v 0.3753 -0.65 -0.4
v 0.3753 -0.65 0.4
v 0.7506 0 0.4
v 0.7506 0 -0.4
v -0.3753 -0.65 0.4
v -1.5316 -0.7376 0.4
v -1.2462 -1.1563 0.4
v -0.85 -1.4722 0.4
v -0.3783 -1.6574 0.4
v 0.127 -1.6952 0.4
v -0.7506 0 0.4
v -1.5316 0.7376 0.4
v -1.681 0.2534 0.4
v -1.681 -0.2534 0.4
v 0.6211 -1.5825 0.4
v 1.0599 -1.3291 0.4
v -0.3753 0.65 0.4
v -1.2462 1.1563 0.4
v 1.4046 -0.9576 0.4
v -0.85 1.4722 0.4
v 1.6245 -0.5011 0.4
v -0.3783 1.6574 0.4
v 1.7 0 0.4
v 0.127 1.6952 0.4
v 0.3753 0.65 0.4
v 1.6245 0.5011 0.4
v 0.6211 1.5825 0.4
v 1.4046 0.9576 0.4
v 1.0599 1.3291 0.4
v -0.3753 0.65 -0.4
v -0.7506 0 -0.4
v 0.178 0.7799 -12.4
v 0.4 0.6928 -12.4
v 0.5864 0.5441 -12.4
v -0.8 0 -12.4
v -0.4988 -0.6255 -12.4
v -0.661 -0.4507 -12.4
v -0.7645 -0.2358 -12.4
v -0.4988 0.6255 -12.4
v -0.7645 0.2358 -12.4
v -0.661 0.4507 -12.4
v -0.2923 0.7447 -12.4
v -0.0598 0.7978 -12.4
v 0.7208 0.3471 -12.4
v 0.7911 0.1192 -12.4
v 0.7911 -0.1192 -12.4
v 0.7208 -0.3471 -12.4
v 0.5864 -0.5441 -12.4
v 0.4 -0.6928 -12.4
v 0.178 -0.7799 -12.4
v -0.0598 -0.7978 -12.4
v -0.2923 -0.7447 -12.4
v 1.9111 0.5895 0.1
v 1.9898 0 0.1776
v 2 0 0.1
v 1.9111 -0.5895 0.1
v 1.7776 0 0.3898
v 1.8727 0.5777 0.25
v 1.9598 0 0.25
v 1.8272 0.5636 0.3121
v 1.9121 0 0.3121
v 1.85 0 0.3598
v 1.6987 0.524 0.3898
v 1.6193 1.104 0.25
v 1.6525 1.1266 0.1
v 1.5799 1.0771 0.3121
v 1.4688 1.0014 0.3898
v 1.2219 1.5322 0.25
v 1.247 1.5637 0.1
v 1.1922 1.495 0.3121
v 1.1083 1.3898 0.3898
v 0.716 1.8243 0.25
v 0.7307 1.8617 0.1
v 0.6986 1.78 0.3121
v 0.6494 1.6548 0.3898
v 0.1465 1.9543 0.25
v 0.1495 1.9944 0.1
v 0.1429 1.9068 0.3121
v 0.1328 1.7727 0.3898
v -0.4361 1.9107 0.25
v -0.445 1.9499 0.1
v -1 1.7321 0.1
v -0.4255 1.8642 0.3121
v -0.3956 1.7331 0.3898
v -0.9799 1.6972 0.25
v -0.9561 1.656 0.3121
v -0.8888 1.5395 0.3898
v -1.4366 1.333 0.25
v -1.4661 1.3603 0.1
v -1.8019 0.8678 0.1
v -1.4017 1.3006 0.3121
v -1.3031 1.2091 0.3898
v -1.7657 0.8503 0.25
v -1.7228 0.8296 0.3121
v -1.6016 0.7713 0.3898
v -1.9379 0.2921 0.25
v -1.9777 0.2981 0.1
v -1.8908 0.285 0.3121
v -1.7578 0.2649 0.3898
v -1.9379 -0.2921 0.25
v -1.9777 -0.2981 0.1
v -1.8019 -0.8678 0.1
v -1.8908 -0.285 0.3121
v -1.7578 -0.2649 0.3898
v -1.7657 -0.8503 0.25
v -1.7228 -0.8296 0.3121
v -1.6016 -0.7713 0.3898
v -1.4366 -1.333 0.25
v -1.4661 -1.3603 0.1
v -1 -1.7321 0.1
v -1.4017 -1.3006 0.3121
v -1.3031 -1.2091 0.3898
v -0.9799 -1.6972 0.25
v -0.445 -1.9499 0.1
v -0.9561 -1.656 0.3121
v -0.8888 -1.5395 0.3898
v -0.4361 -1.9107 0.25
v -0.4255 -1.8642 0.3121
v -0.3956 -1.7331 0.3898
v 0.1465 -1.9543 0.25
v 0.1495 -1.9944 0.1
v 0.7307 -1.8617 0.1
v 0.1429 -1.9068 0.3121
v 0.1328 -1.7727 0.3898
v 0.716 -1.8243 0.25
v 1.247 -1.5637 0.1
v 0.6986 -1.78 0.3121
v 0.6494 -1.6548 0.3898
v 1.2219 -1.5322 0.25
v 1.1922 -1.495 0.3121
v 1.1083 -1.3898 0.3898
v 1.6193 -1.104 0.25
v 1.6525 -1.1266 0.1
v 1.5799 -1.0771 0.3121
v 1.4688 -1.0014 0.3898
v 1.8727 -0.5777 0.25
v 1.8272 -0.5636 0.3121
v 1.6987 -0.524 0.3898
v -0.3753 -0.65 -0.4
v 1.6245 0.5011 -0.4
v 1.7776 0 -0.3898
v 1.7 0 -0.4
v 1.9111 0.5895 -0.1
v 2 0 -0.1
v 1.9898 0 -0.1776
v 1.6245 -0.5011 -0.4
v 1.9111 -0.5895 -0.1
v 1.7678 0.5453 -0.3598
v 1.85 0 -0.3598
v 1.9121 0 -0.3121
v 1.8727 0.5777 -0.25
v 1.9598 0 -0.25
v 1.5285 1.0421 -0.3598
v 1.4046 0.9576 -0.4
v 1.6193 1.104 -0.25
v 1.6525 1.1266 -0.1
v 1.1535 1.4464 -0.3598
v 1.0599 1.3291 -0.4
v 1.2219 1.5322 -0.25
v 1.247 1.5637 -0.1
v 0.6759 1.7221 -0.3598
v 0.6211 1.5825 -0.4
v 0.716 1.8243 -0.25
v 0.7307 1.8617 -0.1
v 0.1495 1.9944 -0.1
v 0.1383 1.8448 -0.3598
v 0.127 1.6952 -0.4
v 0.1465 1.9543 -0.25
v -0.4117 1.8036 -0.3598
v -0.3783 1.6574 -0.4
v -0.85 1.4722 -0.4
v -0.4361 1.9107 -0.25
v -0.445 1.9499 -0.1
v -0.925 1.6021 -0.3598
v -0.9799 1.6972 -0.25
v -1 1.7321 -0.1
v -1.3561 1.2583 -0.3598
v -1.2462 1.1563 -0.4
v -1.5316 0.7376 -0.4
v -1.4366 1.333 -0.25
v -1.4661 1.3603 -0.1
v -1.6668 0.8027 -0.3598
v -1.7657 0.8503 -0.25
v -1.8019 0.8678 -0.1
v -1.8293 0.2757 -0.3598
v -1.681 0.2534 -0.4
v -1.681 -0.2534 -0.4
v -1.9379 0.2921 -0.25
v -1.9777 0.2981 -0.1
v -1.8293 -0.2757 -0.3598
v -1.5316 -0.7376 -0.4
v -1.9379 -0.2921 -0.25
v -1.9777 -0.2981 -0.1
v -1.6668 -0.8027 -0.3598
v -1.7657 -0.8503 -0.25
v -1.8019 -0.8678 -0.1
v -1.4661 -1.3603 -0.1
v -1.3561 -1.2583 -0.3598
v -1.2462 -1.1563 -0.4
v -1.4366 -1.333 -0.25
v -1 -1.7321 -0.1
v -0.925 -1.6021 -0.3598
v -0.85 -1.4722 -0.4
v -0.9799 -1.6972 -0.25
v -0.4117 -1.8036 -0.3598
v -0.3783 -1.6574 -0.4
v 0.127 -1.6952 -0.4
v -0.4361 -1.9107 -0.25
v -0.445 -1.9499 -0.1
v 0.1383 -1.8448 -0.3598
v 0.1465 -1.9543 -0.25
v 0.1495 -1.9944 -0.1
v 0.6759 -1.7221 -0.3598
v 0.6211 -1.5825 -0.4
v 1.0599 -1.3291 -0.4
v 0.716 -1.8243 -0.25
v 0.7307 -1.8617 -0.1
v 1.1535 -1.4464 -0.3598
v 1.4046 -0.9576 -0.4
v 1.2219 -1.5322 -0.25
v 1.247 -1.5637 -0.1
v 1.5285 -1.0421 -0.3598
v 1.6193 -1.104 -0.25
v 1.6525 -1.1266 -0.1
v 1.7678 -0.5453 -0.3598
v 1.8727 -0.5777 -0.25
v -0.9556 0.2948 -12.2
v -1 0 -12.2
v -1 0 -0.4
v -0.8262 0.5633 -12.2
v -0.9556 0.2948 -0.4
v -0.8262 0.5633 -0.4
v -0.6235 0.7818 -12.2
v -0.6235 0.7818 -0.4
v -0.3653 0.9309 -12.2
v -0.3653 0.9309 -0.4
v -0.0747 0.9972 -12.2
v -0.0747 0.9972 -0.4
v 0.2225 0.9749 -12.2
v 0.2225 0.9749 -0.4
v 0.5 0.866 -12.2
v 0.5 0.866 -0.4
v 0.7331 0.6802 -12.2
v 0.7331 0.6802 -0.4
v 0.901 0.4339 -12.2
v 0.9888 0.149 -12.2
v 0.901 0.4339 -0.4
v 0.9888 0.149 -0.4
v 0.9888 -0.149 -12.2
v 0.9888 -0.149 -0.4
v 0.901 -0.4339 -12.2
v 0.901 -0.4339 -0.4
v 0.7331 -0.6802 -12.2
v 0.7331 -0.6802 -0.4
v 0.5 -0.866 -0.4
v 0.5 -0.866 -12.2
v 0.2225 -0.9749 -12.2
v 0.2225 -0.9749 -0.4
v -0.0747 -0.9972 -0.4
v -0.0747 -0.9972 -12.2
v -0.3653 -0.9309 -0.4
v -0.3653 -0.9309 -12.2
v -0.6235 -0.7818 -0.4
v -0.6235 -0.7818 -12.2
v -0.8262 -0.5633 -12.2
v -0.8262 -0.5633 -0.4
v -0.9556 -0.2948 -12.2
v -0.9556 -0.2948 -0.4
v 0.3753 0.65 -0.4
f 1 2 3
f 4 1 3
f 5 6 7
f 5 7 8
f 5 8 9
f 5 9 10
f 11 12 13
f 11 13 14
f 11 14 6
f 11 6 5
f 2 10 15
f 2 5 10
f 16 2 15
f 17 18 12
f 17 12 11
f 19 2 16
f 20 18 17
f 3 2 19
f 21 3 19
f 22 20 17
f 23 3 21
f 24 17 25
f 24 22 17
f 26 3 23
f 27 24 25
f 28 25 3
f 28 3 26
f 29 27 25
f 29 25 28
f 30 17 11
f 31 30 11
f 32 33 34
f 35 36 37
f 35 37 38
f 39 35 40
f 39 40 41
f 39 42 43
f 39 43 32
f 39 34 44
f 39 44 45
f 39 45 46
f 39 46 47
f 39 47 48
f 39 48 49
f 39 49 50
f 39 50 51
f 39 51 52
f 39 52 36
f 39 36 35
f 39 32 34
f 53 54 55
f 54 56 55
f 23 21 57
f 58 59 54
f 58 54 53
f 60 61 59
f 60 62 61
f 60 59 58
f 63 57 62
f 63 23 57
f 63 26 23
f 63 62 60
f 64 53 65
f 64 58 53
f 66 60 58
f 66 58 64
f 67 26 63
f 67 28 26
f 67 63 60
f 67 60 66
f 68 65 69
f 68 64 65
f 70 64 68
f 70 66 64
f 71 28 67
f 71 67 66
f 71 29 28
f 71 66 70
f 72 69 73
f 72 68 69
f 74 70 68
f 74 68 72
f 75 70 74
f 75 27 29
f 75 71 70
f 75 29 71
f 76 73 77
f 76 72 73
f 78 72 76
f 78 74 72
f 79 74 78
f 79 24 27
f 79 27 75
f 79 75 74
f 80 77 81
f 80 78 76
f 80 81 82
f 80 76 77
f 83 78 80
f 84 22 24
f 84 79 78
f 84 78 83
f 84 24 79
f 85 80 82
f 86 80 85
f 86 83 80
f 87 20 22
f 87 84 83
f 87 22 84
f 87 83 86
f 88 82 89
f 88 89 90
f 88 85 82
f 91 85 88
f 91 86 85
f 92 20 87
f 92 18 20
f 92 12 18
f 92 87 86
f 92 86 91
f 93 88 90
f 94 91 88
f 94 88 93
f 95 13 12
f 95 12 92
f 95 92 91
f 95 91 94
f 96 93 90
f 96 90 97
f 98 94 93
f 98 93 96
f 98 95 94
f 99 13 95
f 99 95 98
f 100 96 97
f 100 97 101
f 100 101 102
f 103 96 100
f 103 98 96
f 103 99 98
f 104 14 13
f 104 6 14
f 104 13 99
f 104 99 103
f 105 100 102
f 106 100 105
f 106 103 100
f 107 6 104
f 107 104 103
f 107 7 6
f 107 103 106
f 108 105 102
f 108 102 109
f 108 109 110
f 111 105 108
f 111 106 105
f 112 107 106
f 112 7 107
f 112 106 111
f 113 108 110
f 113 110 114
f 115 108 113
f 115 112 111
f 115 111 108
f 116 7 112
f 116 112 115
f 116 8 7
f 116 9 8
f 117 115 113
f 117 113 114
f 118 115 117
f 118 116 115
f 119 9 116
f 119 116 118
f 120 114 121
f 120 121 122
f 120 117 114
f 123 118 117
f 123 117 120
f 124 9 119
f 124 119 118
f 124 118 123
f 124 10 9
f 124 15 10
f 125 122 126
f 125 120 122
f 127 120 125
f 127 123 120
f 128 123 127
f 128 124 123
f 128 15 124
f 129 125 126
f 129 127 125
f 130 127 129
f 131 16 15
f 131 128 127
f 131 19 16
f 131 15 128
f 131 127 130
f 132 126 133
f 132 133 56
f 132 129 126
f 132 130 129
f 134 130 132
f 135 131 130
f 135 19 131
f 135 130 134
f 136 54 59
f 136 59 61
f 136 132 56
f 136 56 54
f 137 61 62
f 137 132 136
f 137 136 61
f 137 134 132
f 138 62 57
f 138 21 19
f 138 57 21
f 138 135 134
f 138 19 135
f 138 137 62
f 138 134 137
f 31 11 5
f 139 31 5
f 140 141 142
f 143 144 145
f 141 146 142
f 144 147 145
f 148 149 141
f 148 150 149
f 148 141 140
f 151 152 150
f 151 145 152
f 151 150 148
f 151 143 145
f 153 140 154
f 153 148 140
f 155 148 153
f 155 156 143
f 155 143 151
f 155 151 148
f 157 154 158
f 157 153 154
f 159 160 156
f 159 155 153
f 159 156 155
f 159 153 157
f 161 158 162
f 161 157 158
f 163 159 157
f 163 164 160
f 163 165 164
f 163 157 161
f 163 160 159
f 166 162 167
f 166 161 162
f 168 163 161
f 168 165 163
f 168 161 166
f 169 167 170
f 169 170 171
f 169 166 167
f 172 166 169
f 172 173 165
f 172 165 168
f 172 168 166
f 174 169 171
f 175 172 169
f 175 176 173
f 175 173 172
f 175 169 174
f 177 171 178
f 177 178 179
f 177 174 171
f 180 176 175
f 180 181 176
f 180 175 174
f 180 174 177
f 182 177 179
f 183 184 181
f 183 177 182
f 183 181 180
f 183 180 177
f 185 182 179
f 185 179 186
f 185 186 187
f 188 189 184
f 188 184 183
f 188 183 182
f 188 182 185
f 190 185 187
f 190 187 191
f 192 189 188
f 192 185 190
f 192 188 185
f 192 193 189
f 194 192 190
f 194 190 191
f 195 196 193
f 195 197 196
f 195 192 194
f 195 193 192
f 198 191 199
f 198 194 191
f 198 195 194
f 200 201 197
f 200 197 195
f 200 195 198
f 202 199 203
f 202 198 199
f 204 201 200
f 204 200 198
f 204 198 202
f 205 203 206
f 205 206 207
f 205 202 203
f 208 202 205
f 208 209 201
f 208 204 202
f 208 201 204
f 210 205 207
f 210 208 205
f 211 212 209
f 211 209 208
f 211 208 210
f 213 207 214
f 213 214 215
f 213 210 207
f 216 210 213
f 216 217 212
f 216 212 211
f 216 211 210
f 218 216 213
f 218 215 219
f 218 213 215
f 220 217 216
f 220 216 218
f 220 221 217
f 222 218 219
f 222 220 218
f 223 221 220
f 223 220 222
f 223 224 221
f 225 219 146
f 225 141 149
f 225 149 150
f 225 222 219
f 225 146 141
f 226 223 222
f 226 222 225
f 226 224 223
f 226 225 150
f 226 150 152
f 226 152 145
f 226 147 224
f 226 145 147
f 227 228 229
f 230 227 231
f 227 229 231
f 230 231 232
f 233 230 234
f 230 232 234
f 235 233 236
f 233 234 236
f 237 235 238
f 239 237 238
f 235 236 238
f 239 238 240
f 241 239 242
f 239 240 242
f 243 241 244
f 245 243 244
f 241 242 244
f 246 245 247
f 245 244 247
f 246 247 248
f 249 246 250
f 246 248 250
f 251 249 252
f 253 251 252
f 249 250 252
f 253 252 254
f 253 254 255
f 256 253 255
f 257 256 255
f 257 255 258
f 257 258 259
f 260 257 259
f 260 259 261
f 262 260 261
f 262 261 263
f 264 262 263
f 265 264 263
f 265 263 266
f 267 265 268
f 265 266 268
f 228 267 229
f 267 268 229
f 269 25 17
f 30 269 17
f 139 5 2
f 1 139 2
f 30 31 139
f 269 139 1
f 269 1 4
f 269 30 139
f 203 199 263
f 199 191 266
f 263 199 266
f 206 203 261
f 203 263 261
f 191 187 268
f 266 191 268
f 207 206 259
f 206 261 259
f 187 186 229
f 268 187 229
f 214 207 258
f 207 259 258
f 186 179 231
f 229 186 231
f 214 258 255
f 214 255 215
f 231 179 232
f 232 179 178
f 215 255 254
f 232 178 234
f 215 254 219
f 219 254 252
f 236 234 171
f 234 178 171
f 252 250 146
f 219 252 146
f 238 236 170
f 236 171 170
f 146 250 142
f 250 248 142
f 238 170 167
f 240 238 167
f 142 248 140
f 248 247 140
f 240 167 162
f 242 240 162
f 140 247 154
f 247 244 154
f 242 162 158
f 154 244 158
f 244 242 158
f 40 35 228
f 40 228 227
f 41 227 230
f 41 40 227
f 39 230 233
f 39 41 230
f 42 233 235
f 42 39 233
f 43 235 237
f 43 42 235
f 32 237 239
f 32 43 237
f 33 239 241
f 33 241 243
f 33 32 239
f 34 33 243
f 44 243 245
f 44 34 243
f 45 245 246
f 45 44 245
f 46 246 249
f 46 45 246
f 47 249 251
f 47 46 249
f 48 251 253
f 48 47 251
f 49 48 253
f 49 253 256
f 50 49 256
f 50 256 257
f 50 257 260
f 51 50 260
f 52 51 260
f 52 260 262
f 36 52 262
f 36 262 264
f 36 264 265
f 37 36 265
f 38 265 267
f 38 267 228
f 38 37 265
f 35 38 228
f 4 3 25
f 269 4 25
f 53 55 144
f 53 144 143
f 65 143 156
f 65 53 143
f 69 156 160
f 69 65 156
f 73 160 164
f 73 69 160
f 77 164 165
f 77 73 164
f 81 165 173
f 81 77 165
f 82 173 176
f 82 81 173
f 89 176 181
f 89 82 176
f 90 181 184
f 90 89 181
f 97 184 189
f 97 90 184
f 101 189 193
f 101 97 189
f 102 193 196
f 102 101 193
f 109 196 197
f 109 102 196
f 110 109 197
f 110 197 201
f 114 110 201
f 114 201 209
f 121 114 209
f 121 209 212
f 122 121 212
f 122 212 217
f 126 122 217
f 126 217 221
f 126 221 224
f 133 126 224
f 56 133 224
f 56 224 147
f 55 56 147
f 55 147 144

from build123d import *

# Parameters (mm, degrees)
SKETCH_1_R          = 2
EXTRUDE_1_DEPTH     = 0.4
SKETCH_2_R          = 1
EXTRUDE_2_DEPTH     = 12
CHAMFER_1_SIZE      = 0.2
CUT_EXTRUDE_1_DEPTH = 0.8
FILLET_2_R          = 0.3


with BuildPart() as part:
    # 草图1 → 凸台-拉伸1 (new body, symmetric)
    with BuildSketch(Plane.XY):
        Circle(SKETCH_1_R)
    extrude(amount=EXTRUDE_1_DEPTH, both=True)

    # 草图2 → 凸台-拉伸2 (add)
    with BuildSketch(Plane(origin=(0, 0, -0.4), x_dir=(-1, 0, 0), z_dir=(0, 0, -1))):
        Circle(SKETCH_2_R)
    extrude(amount=EXTRUDE_2_DEPTH)

    # 倒角1
    chamfer_1_edges = [part.edges().sort_by_distance(p)[0] for p in [
        (1, 0, -12.4),
    ]]
    chamfer(chamfer_1_edges, length=CHAMFER_1_SIZE)

    # 草图3 → 切除-拉伸1 (cut)
    with BuildSketch(Plane.XY.offset(0.4)):
        Polygon((0.75055535, 0), (0.375277675, 0.65), (-0.375277675, 0.65), (-0.75055535, 0), (-0.375277675, -0.65), (0.375277675, -0.65), align=None)
    extrude(amount=-CUT_EXTRUDE_1_DEPTH, mode=Mode.SUBTRACT)

    # 圆角2
    fillet_2_edges = [part.edges().sort_by_distance(p)[0] for p in [
        (-2, 0, -0.4),
        (-2, 0, 0.4),
    ]]
    fillet(fillet_2_edges, radius=FILLET_2_R)


solid = part.part
